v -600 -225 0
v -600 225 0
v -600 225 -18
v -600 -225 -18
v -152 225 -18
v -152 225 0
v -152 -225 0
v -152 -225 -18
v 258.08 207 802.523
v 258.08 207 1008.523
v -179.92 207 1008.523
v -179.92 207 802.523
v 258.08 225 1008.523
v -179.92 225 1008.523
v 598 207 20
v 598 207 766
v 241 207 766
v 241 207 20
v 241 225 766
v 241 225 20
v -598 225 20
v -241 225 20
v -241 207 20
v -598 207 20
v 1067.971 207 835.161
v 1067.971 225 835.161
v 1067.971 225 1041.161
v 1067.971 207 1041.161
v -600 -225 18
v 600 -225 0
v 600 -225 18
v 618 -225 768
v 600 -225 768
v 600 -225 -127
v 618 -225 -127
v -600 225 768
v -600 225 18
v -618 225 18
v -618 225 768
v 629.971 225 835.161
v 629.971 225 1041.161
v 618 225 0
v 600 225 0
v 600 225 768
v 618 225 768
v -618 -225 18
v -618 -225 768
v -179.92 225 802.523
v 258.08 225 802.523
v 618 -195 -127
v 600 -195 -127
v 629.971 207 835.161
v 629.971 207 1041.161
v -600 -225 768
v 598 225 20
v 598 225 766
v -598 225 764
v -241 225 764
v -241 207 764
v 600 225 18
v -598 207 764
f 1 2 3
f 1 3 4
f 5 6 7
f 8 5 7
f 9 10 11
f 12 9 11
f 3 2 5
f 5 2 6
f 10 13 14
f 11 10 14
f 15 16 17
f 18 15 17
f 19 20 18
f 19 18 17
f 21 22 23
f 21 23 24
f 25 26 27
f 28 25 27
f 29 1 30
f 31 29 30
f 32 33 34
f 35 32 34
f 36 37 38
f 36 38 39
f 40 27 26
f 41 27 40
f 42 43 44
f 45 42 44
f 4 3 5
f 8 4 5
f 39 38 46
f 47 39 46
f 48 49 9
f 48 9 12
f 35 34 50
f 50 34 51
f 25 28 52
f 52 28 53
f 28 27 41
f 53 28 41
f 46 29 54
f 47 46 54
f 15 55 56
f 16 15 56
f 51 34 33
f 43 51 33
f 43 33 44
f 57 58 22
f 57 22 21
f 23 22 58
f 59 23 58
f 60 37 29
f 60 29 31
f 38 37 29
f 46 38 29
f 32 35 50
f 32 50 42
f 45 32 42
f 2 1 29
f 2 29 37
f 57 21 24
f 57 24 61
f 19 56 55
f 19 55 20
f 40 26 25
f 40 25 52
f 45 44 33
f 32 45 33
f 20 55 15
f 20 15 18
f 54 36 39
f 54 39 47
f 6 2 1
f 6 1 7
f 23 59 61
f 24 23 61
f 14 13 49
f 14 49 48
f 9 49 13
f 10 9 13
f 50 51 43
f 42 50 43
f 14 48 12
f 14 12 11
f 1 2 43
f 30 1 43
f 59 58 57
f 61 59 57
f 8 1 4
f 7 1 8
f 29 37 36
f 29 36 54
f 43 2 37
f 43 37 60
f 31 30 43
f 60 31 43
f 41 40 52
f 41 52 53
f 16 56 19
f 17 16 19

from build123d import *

# Parameters (mm, degrees)
F0_W     = 1200
F0_H     = 450
F1_DEPTH = 18
F2_W     = 357
F2_H     = 746
F2_H_2   = 744
F2_W_2   = 438
F2_H_3   = 206
F3_DEPTH = 18
F5_DEPTH = 18
F6_W     = 450
F6_H     = 750
F7_DEPTH = 18
F8_W     = 448
F8_H     = 450
F9_DEPTH = 18


with BuildPart() as f1:
    # F0 (on Top) → F1 (new body)
    with BuildSketch(Plane.XY):
        Rectangle(F0_W, F0_H)
    extrude(amount=F1_DEPTH)


with BuildPart() as f3:
    # F2 (on face) → F3 (new body)
    with BuildSketch(Plane(origin=(0, 225, 0), x_dir=(-1, 0, 0), z_dir=(0, 1, 0))):
        with Locations((-419.5, 393)):
            Rectangle(F2_W, F2_H)
        with Locations((419.5, 392)):
            Rectangle(F2_W, F2_H_2)
        with Locations((-848.970991, 938.160941)):
            Rectangle(F2_W_2, F2_H_3)
        with Locations((-39.080274, 905.523107)):
            Rectangle(F2_W_2, F2_H_3)
    extrude(amount=-F3_DEPTH)


with BuildPart() as f5:
    # F4 (on face) → F5 (new body)
    with BuildSketch(Plane.YZ.offset(600)):
        Polygon((-225, 768), (-225, -127), (-195, -127), (225, 0), (225, 768), align=None)
    extrude(amount=F5_DEPTH)


with BuildPart() as f7:
    # F6 (on face) → F7 (new body)
    with BuildSketch(Plane(origin=(-600, 0, 0), x_dir=(0, -1, 0), z_dir=(-1, 0, 0))):
        with Locations((0, 393)):
            Rectangle(F6_W, F6_H)
    extrude(amount=F7_DEPTH)


with BuildPart() as f9:
    # F8 (on face) → F9 (new body)
    with BuildSketch(Plane(origin=(0, 0, 0), x_dir=(1, 0, 0), z_dir=(0, 0, -1))):
        with Locations((-376, 0)):
            Rectangle(F8_W, F8_H)
    extrude(amount=F9_DEPTH)


solid = Compound([f1.part, f3.part, f5.part, f7.part, f9.part])
